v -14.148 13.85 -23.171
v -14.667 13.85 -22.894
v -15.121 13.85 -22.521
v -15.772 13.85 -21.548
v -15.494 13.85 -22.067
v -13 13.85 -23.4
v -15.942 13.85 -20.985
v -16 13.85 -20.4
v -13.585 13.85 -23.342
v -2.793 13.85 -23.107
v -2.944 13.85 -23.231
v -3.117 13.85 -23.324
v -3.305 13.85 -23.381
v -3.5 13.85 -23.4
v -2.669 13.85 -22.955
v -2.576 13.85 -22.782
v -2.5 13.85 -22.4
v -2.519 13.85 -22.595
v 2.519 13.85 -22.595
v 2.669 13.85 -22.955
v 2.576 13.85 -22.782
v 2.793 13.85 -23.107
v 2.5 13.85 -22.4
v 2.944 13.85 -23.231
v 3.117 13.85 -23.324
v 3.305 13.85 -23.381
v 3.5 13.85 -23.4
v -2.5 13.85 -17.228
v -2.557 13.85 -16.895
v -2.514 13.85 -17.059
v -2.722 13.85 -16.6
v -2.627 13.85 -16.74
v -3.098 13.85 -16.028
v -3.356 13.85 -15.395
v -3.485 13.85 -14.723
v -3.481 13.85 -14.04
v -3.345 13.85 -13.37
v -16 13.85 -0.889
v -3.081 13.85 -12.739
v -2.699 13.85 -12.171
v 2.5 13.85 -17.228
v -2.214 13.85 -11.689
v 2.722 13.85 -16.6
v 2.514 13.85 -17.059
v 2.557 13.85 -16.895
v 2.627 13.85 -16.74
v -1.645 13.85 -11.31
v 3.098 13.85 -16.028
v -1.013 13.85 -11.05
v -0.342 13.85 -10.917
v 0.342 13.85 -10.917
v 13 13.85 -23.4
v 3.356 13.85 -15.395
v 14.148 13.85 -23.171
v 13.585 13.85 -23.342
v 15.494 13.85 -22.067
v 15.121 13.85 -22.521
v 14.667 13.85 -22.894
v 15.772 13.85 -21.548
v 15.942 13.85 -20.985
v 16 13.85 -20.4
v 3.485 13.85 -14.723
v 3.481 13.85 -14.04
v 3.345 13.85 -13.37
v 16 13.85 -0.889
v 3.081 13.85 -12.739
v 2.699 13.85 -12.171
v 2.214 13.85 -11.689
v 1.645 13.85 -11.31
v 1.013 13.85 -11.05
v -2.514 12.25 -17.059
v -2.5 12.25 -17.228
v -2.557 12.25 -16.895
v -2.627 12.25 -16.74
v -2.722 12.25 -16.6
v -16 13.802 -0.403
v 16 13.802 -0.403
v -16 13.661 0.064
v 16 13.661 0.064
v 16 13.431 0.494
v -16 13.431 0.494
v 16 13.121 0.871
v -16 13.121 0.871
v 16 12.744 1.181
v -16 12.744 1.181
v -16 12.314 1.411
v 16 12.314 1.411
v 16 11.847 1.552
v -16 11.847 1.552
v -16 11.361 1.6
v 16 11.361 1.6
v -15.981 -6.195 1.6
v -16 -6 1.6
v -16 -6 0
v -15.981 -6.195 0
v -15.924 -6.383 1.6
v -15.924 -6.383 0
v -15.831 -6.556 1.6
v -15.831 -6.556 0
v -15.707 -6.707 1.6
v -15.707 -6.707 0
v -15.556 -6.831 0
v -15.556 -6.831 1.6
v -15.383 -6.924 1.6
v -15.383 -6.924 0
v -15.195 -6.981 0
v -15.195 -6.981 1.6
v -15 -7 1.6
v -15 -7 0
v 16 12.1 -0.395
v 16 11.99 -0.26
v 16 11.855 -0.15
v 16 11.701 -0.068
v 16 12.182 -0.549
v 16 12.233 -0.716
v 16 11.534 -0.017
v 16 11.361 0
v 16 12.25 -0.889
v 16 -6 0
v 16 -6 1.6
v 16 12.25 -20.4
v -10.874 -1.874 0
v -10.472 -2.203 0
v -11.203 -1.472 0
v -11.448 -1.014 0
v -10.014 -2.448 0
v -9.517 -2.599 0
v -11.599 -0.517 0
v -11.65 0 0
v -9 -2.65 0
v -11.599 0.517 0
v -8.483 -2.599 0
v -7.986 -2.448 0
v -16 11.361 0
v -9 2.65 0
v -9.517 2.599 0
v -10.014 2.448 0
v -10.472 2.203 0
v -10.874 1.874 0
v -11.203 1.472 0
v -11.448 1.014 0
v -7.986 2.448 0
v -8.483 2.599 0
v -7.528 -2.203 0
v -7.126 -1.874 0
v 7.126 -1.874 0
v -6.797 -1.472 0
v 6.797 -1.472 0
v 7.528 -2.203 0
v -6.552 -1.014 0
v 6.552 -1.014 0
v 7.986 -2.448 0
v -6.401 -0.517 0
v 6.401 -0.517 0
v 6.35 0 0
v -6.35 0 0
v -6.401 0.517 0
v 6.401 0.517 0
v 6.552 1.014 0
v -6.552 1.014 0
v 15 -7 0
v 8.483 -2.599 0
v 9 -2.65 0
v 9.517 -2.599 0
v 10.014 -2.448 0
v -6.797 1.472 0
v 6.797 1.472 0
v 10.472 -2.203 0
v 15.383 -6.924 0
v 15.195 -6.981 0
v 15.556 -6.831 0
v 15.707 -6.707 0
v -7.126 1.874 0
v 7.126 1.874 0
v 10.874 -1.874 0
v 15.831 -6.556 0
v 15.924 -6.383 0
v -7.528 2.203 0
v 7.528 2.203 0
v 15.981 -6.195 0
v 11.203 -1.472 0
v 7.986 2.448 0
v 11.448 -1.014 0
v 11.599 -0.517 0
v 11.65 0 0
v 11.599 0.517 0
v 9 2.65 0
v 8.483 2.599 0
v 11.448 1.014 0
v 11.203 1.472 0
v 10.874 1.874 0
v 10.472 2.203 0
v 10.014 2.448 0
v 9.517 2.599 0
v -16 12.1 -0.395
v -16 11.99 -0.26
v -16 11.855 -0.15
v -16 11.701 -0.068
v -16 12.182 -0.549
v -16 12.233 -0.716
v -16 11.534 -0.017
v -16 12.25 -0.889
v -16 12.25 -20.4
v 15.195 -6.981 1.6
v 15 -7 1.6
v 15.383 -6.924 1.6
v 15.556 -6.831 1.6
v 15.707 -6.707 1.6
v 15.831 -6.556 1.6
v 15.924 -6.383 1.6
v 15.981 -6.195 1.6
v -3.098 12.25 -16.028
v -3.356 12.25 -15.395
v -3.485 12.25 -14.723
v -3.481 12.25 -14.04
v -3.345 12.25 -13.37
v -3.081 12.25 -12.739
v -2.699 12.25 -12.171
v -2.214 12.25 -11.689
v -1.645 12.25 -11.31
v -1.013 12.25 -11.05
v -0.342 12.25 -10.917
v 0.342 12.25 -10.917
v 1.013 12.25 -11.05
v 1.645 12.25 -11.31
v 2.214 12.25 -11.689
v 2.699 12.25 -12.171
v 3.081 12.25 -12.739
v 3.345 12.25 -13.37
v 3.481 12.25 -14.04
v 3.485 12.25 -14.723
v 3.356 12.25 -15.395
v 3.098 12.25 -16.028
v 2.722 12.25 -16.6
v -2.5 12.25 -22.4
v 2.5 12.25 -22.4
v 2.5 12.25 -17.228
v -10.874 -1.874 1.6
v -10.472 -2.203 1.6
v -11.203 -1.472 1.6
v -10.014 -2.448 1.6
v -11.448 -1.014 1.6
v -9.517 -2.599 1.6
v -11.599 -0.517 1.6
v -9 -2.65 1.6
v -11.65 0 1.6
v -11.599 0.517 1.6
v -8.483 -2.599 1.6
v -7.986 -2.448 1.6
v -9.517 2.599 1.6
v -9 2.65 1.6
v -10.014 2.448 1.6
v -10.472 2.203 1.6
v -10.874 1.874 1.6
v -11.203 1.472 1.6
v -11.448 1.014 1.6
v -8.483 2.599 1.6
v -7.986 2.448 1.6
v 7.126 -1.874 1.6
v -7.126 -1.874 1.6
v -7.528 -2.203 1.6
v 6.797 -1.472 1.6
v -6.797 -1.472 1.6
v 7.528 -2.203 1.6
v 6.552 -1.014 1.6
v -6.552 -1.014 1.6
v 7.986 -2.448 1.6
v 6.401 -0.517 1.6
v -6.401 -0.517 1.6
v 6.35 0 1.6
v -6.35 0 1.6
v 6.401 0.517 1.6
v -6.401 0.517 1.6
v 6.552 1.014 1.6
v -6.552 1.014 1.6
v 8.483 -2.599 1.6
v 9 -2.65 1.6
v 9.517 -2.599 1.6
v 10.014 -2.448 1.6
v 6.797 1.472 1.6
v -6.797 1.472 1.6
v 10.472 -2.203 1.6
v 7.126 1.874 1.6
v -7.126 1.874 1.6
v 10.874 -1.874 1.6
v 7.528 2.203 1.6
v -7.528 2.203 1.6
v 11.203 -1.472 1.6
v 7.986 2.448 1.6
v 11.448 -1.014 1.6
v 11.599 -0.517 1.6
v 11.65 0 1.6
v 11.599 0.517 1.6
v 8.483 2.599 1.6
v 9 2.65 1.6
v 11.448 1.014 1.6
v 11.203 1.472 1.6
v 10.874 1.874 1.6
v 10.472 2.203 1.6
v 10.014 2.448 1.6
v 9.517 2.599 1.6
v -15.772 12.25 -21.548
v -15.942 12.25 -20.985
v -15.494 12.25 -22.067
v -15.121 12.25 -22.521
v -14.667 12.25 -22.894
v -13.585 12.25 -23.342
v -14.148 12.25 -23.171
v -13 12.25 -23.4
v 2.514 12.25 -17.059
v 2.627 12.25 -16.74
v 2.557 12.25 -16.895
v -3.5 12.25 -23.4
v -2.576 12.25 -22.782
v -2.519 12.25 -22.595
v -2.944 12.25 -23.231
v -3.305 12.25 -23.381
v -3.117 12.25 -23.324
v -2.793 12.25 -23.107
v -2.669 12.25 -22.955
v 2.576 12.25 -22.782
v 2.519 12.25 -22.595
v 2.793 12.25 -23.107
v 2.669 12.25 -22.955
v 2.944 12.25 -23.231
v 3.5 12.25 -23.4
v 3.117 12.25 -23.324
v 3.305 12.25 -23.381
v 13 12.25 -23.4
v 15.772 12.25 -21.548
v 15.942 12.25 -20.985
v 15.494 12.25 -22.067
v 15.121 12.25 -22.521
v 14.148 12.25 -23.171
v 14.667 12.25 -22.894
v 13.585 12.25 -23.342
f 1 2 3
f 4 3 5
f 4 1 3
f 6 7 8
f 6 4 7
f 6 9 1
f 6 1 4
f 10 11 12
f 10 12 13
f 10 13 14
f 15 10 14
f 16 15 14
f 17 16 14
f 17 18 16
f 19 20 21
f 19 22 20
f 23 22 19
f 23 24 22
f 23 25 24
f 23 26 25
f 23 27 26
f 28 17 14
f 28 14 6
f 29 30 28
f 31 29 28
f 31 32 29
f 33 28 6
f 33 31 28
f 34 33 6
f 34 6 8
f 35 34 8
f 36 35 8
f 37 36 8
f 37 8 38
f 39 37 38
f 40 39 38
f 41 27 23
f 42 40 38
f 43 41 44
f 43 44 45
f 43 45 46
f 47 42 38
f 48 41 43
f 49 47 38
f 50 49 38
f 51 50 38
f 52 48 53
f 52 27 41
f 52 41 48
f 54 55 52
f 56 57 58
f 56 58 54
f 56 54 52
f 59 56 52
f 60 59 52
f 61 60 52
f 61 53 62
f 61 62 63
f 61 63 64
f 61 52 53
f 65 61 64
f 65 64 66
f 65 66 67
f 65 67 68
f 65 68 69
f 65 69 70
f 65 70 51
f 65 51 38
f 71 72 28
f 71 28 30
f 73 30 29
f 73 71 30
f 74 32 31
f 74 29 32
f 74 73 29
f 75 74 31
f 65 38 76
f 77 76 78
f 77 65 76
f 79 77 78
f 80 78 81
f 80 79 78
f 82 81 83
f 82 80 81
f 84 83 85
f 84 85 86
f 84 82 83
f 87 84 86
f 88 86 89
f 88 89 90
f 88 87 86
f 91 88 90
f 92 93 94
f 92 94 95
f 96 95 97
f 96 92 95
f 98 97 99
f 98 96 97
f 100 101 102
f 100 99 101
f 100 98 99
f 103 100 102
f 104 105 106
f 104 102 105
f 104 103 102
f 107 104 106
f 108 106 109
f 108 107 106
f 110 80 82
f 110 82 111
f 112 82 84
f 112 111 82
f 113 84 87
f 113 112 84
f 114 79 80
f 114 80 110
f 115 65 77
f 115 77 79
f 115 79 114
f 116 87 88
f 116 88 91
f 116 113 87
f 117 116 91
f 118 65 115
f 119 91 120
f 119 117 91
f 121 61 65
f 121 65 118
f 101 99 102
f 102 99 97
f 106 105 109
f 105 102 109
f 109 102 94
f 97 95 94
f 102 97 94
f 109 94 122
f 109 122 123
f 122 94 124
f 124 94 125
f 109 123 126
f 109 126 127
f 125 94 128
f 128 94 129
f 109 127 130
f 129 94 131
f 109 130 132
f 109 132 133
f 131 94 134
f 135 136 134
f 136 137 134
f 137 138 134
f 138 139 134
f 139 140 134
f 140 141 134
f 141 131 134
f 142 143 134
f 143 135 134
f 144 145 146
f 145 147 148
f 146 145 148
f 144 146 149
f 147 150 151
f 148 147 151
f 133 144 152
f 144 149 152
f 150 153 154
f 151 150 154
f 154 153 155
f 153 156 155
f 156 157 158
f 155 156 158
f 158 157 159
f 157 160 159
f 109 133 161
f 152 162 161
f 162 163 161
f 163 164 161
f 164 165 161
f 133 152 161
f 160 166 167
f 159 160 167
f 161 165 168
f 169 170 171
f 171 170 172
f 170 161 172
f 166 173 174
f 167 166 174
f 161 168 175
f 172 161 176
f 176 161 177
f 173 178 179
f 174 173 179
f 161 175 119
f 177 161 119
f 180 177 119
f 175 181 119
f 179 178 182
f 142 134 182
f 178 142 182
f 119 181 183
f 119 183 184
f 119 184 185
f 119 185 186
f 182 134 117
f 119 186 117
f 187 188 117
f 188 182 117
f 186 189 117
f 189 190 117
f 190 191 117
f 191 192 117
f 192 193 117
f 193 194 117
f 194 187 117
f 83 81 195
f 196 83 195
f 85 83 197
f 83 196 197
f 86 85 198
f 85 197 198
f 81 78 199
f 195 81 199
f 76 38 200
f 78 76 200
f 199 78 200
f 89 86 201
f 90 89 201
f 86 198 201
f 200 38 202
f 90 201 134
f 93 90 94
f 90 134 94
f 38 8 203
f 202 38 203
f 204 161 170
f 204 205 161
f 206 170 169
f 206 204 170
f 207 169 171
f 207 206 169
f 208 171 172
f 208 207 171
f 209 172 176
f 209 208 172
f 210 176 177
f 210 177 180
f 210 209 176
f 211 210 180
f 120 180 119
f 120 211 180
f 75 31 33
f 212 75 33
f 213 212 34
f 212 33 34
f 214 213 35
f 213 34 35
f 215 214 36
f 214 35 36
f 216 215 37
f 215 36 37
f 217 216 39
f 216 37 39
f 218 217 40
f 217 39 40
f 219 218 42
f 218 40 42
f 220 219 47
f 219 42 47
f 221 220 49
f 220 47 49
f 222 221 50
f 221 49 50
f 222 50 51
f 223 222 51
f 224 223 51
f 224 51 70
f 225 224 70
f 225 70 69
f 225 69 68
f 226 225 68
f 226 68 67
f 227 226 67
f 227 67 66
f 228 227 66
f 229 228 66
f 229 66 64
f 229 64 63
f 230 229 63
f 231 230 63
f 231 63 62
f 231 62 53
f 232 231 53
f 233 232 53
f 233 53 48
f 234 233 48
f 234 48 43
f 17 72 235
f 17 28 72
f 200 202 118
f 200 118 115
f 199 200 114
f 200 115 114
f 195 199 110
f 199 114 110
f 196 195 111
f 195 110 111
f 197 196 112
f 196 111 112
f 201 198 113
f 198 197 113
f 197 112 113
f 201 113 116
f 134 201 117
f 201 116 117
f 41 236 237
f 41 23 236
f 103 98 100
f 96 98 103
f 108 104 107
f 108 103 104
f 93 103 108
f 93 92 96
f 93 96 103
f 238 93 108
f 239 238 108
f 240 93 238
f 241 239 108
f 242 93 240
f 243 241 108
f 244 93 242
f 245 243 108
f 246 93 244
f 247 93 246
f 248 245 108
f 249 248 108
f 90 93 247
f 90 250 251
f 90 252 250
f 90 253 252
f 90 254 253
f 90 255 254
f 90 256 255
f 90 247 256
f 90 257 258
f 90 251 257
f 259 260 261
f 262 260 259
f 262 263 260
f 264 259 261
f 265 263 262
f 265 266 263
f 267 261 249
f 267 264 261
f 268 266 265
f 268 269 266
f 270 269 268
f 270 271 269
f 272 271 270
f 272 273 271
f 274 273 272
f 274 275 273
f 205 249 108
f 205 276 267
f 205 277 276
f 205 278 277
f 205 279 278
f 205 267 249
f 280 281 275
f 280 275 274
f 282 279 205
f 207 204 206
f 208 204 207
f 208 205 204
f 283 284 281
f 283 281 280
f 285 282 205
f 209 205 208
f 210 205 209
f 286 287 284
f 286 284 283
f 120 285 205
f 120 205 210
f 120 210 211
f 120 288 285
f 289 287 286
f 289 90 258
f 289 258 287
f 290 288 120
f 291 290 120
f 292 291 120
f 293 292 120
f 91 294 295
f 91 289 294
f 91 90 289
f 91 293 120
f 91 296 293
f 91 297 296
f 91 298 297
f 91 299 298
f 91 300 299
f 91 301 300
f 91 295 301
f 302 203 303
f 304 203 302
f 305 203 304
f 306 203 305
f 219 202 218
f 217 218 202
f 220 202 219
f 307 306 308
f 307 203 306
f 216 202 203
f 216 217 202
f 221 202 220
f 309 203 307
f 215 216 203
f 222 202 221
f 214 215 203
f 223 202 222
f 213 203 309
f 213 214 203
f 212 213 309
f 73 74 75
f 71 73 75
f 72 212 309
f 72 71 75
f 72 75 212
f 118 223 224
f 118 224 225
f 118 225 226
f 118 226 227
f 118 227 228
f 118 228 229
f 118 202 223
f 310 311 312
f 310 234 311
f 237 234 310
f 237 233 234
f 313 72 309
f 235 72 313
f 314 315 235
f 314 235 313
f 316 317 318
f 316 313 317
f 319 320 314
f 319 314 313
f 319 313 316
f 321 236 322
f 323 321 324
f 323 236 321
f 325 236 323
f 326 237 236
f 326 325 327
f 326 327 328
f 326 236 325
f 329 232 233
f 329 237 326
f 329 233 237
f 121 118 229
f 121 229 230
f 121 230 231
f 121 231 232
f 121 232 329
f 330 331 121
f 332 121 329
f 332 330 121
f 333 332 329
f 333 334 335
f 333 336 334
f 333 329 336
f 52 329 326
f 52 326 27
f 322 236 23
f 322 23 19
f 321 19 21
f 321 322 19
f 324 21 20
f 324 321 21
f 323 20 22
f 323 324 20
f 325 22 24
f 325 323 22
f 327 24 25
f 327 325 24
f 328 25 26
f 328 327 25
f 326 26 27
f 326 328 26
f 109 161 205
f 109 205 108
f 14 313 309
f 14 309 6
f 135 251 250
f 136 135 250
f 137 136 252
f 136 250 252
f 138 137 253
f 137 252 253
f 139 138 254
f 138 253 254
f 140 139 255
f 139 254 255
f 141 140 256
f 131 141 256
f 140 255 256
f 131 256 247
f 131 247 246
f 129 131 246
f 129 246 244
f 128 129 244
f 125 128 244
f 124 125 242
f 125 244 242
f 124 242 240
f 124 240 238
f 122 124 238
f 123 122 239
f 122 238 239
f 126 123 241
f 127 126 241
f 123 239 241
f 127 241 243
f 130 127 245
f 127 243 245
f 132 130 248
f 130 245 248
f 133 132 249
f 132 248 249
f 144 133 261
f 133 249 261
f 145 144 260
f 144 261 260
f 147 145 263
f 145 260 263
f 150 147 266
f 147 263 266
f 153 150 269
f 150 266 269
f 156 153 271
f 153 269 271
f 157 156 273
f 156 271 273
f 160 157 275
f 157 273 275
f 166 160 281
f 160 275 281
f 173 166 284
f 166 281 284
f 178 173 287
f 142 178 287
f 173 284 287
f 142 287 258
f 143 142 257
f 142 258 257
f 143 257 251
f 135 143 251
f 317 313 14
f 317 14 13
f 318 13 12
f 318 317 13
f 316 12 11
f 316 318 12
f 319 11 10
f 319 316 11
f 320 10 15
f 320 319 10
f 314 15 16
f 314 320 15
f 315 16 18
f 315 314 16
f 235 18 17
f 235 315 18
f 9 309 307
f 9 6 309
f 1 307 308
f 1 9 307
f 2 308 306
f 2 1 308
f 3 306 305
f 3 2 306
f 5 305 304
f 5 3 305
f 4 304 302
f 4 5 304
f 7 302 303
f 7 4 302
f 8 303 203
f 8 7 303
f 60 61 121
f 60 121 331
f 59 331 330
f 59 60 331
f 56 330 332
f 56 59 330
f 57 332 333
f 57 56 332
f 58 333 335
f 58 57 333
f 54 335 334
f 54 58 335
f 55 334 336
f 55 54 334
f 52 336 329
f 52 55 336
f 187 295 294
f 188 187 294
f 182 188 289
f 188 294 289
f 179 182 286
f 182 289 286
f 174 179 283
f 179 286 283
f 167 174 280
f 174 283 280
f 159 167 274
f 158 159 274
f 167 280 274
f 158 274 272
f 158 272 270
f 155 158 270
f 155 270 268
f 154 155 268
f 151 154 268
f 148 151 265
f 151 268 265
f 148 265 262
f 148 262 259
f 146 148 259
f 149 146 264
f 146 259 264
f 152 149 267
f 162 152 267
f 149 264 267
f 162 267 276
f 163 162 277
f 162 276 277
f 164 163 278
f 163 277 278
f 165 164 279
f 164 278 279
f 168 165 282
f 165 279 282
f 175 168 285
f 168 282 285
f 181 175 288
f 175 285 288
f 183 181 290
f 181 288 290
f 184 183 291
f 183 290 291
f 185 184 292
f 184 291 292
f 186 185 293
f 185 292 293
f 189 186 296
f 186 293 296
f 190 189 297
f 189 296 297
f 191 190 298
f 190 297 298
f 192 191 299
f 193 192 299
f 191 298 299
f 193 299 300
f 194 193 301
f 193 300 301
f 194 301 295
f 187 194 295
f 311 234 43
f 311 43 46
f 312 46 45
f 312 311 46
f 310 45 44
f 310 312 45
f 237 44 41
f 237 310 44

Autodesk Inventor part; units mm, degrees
ref_plane "YZ Plane" through (0, 0, 0) normal (1, 0, 0) x (0, 1, 0)
ref_plane "XZ Plane" through (0, 0, 0) normal (0, 1, 0) x (-1, 0, 0)
ref_plane "XY Plane" through (0, 0, 0) normal (0, 0, 1) x (1, 0, 0)
sketch "Sketch1" plane through (0, 0, 0) normal (0, 0, 1) x (1, 0, 0)
  line L0 (16, -7) -> (-16, -7)
  line L1 (-16, -7) -> (-16, 7)
  line L2 (-16, 7) -> (16, 7)
  line L3 (16, 7) -> (16, -7)
  line L4 (16, -7) -> (-16, 7) construction
  line L5 (-16, -7) -> (16, 7) construction
  line L6 (-9, 0) -> (9, 0) construction
  line L7 (-16, 7) -> (16, 7)
  line L8 (16, 7) -> (16, 12.25)
  line L9 (16, 12.25) -> (-16, 12.25)
  line L10 (-16, 12.25) -> (-16, 7)
  point P0 (0, 0)
  dimension "d126" = 32
  dimension "d127" = 14
  dimension "d128" = 7
  dimension "d129" = 12.25
extrude "Plate4" add sketch "Sketch1" along normal blind 1.6002
fillet "Fillet7" radius 1 2 edges at (16, -7, 0.8001) (-16, -7, 0.8001)
hole "Hole4" at (-9, 0, 0) at (9, 0, 0) direction (0, 0, 1) diameter 5.3 end through all
sketch "Sketch10" plane through (16, 12.25, 0) normal (0, 1, 0) x (-1, 0, 0)
  line L0 (32, 0) -> (0, 0)
  line L1 (0, 0) -> (0, -23.3998)
  line L2 (0, -23.3998) -> (32, -23.3998)
  line L3 (32, -23.3998) -> (32, 0)
edge flange "Flange5" height 25 angle 90 thickness 1.6002 bend radius 0.889 thickness toward (0, 1, 0) relief tear relief width 1.6002 relief depth 0.8001 edges at (0, 12.25, 0) wall of the first edge with corners at (-16, 12.25, 0) (16, 12.25, 0) (16, 12.25, -23.3998) (-16, 12.25, -23.3998)
bend "Bend5"
corner "Corner5"
fillet "Fillet8" radius 3 2 edges at (16, 13.0501, -23.3998) (-16, 13.0501, -23.3998)
sketch "Sketch11" plane through (-16, 13.8502, -0.889) normal (0, 1, 0) x (1, 0, 0)
  arc A0 (32, 19.5108) -> (29, 22.5108) centre (29, 19.5108) ccw projected
  line L0 (3, 22.5108) -> (29, 22.5108) projected
  arc A1 (3, 22.5108) -> (0, 19.5108) centre (3, 19.5108) ccw projected
  line L1 (0, 0) -> (0, 19.5108) projected
  line L2 (0, 0) -> (32, 0) projected
  line L3 (32, 19.5108) -> (32, 0) projected
  circle A2 centre (16, 13.5108) radius 3.5
  line L4 (13.5, 22.5108) -> (18.5, 22.5108)
  line L5 (18.5, 22.5108) -> (18.5, 15.9603)
  line L6 (18.5, 15.9603) -> (13.5, 15.9603)
  line L7 (13.5, 15.9603) -> (13.5, 22.5108)
  point P0 (16, -0.889)
  point P1 (16, 22.5108)
  dimension "d149" = 7
  dimension "d150" = 9
  dimension "d151" = 5
extrude "Extrusion7" cut sketch "Sketch11" against normal through all contours L5 A2 L7 L0 | L6 A2 | A2 L6
fillet "Fillet9" radius 1 2 edges at (-2.5, 13.0501, -16.8493) (2.5, 13.0501, -16.8493)
fillet "Fillet10" radius 1 2 edges at (-2.5, 13.0501, -23.3998) (2.5, 13.0501, -23.3998)
equation "\"d71\" = Thickness"
equation "\"BendReliefWidth\" = Thickness"
equation "\"BendReliefDepth\" = 0.5 * Thickness"
equation "\"CornerReliefSize\" = 4 * Thickness"
equation "\"MinimumRemnant\" = 2 * Thickness"
equation "\"TransitionRadius\" = BendRadius"
equation "\"JacobiRadiusSize\" = BendRadius"
equation "\"GapSize\" = Thickness"
equation "\"Thickness\" = 1.6002"
equation "\"BendRadius\" = 0.889"
properties part number "Door Stop" material "Aluminum 6061"
